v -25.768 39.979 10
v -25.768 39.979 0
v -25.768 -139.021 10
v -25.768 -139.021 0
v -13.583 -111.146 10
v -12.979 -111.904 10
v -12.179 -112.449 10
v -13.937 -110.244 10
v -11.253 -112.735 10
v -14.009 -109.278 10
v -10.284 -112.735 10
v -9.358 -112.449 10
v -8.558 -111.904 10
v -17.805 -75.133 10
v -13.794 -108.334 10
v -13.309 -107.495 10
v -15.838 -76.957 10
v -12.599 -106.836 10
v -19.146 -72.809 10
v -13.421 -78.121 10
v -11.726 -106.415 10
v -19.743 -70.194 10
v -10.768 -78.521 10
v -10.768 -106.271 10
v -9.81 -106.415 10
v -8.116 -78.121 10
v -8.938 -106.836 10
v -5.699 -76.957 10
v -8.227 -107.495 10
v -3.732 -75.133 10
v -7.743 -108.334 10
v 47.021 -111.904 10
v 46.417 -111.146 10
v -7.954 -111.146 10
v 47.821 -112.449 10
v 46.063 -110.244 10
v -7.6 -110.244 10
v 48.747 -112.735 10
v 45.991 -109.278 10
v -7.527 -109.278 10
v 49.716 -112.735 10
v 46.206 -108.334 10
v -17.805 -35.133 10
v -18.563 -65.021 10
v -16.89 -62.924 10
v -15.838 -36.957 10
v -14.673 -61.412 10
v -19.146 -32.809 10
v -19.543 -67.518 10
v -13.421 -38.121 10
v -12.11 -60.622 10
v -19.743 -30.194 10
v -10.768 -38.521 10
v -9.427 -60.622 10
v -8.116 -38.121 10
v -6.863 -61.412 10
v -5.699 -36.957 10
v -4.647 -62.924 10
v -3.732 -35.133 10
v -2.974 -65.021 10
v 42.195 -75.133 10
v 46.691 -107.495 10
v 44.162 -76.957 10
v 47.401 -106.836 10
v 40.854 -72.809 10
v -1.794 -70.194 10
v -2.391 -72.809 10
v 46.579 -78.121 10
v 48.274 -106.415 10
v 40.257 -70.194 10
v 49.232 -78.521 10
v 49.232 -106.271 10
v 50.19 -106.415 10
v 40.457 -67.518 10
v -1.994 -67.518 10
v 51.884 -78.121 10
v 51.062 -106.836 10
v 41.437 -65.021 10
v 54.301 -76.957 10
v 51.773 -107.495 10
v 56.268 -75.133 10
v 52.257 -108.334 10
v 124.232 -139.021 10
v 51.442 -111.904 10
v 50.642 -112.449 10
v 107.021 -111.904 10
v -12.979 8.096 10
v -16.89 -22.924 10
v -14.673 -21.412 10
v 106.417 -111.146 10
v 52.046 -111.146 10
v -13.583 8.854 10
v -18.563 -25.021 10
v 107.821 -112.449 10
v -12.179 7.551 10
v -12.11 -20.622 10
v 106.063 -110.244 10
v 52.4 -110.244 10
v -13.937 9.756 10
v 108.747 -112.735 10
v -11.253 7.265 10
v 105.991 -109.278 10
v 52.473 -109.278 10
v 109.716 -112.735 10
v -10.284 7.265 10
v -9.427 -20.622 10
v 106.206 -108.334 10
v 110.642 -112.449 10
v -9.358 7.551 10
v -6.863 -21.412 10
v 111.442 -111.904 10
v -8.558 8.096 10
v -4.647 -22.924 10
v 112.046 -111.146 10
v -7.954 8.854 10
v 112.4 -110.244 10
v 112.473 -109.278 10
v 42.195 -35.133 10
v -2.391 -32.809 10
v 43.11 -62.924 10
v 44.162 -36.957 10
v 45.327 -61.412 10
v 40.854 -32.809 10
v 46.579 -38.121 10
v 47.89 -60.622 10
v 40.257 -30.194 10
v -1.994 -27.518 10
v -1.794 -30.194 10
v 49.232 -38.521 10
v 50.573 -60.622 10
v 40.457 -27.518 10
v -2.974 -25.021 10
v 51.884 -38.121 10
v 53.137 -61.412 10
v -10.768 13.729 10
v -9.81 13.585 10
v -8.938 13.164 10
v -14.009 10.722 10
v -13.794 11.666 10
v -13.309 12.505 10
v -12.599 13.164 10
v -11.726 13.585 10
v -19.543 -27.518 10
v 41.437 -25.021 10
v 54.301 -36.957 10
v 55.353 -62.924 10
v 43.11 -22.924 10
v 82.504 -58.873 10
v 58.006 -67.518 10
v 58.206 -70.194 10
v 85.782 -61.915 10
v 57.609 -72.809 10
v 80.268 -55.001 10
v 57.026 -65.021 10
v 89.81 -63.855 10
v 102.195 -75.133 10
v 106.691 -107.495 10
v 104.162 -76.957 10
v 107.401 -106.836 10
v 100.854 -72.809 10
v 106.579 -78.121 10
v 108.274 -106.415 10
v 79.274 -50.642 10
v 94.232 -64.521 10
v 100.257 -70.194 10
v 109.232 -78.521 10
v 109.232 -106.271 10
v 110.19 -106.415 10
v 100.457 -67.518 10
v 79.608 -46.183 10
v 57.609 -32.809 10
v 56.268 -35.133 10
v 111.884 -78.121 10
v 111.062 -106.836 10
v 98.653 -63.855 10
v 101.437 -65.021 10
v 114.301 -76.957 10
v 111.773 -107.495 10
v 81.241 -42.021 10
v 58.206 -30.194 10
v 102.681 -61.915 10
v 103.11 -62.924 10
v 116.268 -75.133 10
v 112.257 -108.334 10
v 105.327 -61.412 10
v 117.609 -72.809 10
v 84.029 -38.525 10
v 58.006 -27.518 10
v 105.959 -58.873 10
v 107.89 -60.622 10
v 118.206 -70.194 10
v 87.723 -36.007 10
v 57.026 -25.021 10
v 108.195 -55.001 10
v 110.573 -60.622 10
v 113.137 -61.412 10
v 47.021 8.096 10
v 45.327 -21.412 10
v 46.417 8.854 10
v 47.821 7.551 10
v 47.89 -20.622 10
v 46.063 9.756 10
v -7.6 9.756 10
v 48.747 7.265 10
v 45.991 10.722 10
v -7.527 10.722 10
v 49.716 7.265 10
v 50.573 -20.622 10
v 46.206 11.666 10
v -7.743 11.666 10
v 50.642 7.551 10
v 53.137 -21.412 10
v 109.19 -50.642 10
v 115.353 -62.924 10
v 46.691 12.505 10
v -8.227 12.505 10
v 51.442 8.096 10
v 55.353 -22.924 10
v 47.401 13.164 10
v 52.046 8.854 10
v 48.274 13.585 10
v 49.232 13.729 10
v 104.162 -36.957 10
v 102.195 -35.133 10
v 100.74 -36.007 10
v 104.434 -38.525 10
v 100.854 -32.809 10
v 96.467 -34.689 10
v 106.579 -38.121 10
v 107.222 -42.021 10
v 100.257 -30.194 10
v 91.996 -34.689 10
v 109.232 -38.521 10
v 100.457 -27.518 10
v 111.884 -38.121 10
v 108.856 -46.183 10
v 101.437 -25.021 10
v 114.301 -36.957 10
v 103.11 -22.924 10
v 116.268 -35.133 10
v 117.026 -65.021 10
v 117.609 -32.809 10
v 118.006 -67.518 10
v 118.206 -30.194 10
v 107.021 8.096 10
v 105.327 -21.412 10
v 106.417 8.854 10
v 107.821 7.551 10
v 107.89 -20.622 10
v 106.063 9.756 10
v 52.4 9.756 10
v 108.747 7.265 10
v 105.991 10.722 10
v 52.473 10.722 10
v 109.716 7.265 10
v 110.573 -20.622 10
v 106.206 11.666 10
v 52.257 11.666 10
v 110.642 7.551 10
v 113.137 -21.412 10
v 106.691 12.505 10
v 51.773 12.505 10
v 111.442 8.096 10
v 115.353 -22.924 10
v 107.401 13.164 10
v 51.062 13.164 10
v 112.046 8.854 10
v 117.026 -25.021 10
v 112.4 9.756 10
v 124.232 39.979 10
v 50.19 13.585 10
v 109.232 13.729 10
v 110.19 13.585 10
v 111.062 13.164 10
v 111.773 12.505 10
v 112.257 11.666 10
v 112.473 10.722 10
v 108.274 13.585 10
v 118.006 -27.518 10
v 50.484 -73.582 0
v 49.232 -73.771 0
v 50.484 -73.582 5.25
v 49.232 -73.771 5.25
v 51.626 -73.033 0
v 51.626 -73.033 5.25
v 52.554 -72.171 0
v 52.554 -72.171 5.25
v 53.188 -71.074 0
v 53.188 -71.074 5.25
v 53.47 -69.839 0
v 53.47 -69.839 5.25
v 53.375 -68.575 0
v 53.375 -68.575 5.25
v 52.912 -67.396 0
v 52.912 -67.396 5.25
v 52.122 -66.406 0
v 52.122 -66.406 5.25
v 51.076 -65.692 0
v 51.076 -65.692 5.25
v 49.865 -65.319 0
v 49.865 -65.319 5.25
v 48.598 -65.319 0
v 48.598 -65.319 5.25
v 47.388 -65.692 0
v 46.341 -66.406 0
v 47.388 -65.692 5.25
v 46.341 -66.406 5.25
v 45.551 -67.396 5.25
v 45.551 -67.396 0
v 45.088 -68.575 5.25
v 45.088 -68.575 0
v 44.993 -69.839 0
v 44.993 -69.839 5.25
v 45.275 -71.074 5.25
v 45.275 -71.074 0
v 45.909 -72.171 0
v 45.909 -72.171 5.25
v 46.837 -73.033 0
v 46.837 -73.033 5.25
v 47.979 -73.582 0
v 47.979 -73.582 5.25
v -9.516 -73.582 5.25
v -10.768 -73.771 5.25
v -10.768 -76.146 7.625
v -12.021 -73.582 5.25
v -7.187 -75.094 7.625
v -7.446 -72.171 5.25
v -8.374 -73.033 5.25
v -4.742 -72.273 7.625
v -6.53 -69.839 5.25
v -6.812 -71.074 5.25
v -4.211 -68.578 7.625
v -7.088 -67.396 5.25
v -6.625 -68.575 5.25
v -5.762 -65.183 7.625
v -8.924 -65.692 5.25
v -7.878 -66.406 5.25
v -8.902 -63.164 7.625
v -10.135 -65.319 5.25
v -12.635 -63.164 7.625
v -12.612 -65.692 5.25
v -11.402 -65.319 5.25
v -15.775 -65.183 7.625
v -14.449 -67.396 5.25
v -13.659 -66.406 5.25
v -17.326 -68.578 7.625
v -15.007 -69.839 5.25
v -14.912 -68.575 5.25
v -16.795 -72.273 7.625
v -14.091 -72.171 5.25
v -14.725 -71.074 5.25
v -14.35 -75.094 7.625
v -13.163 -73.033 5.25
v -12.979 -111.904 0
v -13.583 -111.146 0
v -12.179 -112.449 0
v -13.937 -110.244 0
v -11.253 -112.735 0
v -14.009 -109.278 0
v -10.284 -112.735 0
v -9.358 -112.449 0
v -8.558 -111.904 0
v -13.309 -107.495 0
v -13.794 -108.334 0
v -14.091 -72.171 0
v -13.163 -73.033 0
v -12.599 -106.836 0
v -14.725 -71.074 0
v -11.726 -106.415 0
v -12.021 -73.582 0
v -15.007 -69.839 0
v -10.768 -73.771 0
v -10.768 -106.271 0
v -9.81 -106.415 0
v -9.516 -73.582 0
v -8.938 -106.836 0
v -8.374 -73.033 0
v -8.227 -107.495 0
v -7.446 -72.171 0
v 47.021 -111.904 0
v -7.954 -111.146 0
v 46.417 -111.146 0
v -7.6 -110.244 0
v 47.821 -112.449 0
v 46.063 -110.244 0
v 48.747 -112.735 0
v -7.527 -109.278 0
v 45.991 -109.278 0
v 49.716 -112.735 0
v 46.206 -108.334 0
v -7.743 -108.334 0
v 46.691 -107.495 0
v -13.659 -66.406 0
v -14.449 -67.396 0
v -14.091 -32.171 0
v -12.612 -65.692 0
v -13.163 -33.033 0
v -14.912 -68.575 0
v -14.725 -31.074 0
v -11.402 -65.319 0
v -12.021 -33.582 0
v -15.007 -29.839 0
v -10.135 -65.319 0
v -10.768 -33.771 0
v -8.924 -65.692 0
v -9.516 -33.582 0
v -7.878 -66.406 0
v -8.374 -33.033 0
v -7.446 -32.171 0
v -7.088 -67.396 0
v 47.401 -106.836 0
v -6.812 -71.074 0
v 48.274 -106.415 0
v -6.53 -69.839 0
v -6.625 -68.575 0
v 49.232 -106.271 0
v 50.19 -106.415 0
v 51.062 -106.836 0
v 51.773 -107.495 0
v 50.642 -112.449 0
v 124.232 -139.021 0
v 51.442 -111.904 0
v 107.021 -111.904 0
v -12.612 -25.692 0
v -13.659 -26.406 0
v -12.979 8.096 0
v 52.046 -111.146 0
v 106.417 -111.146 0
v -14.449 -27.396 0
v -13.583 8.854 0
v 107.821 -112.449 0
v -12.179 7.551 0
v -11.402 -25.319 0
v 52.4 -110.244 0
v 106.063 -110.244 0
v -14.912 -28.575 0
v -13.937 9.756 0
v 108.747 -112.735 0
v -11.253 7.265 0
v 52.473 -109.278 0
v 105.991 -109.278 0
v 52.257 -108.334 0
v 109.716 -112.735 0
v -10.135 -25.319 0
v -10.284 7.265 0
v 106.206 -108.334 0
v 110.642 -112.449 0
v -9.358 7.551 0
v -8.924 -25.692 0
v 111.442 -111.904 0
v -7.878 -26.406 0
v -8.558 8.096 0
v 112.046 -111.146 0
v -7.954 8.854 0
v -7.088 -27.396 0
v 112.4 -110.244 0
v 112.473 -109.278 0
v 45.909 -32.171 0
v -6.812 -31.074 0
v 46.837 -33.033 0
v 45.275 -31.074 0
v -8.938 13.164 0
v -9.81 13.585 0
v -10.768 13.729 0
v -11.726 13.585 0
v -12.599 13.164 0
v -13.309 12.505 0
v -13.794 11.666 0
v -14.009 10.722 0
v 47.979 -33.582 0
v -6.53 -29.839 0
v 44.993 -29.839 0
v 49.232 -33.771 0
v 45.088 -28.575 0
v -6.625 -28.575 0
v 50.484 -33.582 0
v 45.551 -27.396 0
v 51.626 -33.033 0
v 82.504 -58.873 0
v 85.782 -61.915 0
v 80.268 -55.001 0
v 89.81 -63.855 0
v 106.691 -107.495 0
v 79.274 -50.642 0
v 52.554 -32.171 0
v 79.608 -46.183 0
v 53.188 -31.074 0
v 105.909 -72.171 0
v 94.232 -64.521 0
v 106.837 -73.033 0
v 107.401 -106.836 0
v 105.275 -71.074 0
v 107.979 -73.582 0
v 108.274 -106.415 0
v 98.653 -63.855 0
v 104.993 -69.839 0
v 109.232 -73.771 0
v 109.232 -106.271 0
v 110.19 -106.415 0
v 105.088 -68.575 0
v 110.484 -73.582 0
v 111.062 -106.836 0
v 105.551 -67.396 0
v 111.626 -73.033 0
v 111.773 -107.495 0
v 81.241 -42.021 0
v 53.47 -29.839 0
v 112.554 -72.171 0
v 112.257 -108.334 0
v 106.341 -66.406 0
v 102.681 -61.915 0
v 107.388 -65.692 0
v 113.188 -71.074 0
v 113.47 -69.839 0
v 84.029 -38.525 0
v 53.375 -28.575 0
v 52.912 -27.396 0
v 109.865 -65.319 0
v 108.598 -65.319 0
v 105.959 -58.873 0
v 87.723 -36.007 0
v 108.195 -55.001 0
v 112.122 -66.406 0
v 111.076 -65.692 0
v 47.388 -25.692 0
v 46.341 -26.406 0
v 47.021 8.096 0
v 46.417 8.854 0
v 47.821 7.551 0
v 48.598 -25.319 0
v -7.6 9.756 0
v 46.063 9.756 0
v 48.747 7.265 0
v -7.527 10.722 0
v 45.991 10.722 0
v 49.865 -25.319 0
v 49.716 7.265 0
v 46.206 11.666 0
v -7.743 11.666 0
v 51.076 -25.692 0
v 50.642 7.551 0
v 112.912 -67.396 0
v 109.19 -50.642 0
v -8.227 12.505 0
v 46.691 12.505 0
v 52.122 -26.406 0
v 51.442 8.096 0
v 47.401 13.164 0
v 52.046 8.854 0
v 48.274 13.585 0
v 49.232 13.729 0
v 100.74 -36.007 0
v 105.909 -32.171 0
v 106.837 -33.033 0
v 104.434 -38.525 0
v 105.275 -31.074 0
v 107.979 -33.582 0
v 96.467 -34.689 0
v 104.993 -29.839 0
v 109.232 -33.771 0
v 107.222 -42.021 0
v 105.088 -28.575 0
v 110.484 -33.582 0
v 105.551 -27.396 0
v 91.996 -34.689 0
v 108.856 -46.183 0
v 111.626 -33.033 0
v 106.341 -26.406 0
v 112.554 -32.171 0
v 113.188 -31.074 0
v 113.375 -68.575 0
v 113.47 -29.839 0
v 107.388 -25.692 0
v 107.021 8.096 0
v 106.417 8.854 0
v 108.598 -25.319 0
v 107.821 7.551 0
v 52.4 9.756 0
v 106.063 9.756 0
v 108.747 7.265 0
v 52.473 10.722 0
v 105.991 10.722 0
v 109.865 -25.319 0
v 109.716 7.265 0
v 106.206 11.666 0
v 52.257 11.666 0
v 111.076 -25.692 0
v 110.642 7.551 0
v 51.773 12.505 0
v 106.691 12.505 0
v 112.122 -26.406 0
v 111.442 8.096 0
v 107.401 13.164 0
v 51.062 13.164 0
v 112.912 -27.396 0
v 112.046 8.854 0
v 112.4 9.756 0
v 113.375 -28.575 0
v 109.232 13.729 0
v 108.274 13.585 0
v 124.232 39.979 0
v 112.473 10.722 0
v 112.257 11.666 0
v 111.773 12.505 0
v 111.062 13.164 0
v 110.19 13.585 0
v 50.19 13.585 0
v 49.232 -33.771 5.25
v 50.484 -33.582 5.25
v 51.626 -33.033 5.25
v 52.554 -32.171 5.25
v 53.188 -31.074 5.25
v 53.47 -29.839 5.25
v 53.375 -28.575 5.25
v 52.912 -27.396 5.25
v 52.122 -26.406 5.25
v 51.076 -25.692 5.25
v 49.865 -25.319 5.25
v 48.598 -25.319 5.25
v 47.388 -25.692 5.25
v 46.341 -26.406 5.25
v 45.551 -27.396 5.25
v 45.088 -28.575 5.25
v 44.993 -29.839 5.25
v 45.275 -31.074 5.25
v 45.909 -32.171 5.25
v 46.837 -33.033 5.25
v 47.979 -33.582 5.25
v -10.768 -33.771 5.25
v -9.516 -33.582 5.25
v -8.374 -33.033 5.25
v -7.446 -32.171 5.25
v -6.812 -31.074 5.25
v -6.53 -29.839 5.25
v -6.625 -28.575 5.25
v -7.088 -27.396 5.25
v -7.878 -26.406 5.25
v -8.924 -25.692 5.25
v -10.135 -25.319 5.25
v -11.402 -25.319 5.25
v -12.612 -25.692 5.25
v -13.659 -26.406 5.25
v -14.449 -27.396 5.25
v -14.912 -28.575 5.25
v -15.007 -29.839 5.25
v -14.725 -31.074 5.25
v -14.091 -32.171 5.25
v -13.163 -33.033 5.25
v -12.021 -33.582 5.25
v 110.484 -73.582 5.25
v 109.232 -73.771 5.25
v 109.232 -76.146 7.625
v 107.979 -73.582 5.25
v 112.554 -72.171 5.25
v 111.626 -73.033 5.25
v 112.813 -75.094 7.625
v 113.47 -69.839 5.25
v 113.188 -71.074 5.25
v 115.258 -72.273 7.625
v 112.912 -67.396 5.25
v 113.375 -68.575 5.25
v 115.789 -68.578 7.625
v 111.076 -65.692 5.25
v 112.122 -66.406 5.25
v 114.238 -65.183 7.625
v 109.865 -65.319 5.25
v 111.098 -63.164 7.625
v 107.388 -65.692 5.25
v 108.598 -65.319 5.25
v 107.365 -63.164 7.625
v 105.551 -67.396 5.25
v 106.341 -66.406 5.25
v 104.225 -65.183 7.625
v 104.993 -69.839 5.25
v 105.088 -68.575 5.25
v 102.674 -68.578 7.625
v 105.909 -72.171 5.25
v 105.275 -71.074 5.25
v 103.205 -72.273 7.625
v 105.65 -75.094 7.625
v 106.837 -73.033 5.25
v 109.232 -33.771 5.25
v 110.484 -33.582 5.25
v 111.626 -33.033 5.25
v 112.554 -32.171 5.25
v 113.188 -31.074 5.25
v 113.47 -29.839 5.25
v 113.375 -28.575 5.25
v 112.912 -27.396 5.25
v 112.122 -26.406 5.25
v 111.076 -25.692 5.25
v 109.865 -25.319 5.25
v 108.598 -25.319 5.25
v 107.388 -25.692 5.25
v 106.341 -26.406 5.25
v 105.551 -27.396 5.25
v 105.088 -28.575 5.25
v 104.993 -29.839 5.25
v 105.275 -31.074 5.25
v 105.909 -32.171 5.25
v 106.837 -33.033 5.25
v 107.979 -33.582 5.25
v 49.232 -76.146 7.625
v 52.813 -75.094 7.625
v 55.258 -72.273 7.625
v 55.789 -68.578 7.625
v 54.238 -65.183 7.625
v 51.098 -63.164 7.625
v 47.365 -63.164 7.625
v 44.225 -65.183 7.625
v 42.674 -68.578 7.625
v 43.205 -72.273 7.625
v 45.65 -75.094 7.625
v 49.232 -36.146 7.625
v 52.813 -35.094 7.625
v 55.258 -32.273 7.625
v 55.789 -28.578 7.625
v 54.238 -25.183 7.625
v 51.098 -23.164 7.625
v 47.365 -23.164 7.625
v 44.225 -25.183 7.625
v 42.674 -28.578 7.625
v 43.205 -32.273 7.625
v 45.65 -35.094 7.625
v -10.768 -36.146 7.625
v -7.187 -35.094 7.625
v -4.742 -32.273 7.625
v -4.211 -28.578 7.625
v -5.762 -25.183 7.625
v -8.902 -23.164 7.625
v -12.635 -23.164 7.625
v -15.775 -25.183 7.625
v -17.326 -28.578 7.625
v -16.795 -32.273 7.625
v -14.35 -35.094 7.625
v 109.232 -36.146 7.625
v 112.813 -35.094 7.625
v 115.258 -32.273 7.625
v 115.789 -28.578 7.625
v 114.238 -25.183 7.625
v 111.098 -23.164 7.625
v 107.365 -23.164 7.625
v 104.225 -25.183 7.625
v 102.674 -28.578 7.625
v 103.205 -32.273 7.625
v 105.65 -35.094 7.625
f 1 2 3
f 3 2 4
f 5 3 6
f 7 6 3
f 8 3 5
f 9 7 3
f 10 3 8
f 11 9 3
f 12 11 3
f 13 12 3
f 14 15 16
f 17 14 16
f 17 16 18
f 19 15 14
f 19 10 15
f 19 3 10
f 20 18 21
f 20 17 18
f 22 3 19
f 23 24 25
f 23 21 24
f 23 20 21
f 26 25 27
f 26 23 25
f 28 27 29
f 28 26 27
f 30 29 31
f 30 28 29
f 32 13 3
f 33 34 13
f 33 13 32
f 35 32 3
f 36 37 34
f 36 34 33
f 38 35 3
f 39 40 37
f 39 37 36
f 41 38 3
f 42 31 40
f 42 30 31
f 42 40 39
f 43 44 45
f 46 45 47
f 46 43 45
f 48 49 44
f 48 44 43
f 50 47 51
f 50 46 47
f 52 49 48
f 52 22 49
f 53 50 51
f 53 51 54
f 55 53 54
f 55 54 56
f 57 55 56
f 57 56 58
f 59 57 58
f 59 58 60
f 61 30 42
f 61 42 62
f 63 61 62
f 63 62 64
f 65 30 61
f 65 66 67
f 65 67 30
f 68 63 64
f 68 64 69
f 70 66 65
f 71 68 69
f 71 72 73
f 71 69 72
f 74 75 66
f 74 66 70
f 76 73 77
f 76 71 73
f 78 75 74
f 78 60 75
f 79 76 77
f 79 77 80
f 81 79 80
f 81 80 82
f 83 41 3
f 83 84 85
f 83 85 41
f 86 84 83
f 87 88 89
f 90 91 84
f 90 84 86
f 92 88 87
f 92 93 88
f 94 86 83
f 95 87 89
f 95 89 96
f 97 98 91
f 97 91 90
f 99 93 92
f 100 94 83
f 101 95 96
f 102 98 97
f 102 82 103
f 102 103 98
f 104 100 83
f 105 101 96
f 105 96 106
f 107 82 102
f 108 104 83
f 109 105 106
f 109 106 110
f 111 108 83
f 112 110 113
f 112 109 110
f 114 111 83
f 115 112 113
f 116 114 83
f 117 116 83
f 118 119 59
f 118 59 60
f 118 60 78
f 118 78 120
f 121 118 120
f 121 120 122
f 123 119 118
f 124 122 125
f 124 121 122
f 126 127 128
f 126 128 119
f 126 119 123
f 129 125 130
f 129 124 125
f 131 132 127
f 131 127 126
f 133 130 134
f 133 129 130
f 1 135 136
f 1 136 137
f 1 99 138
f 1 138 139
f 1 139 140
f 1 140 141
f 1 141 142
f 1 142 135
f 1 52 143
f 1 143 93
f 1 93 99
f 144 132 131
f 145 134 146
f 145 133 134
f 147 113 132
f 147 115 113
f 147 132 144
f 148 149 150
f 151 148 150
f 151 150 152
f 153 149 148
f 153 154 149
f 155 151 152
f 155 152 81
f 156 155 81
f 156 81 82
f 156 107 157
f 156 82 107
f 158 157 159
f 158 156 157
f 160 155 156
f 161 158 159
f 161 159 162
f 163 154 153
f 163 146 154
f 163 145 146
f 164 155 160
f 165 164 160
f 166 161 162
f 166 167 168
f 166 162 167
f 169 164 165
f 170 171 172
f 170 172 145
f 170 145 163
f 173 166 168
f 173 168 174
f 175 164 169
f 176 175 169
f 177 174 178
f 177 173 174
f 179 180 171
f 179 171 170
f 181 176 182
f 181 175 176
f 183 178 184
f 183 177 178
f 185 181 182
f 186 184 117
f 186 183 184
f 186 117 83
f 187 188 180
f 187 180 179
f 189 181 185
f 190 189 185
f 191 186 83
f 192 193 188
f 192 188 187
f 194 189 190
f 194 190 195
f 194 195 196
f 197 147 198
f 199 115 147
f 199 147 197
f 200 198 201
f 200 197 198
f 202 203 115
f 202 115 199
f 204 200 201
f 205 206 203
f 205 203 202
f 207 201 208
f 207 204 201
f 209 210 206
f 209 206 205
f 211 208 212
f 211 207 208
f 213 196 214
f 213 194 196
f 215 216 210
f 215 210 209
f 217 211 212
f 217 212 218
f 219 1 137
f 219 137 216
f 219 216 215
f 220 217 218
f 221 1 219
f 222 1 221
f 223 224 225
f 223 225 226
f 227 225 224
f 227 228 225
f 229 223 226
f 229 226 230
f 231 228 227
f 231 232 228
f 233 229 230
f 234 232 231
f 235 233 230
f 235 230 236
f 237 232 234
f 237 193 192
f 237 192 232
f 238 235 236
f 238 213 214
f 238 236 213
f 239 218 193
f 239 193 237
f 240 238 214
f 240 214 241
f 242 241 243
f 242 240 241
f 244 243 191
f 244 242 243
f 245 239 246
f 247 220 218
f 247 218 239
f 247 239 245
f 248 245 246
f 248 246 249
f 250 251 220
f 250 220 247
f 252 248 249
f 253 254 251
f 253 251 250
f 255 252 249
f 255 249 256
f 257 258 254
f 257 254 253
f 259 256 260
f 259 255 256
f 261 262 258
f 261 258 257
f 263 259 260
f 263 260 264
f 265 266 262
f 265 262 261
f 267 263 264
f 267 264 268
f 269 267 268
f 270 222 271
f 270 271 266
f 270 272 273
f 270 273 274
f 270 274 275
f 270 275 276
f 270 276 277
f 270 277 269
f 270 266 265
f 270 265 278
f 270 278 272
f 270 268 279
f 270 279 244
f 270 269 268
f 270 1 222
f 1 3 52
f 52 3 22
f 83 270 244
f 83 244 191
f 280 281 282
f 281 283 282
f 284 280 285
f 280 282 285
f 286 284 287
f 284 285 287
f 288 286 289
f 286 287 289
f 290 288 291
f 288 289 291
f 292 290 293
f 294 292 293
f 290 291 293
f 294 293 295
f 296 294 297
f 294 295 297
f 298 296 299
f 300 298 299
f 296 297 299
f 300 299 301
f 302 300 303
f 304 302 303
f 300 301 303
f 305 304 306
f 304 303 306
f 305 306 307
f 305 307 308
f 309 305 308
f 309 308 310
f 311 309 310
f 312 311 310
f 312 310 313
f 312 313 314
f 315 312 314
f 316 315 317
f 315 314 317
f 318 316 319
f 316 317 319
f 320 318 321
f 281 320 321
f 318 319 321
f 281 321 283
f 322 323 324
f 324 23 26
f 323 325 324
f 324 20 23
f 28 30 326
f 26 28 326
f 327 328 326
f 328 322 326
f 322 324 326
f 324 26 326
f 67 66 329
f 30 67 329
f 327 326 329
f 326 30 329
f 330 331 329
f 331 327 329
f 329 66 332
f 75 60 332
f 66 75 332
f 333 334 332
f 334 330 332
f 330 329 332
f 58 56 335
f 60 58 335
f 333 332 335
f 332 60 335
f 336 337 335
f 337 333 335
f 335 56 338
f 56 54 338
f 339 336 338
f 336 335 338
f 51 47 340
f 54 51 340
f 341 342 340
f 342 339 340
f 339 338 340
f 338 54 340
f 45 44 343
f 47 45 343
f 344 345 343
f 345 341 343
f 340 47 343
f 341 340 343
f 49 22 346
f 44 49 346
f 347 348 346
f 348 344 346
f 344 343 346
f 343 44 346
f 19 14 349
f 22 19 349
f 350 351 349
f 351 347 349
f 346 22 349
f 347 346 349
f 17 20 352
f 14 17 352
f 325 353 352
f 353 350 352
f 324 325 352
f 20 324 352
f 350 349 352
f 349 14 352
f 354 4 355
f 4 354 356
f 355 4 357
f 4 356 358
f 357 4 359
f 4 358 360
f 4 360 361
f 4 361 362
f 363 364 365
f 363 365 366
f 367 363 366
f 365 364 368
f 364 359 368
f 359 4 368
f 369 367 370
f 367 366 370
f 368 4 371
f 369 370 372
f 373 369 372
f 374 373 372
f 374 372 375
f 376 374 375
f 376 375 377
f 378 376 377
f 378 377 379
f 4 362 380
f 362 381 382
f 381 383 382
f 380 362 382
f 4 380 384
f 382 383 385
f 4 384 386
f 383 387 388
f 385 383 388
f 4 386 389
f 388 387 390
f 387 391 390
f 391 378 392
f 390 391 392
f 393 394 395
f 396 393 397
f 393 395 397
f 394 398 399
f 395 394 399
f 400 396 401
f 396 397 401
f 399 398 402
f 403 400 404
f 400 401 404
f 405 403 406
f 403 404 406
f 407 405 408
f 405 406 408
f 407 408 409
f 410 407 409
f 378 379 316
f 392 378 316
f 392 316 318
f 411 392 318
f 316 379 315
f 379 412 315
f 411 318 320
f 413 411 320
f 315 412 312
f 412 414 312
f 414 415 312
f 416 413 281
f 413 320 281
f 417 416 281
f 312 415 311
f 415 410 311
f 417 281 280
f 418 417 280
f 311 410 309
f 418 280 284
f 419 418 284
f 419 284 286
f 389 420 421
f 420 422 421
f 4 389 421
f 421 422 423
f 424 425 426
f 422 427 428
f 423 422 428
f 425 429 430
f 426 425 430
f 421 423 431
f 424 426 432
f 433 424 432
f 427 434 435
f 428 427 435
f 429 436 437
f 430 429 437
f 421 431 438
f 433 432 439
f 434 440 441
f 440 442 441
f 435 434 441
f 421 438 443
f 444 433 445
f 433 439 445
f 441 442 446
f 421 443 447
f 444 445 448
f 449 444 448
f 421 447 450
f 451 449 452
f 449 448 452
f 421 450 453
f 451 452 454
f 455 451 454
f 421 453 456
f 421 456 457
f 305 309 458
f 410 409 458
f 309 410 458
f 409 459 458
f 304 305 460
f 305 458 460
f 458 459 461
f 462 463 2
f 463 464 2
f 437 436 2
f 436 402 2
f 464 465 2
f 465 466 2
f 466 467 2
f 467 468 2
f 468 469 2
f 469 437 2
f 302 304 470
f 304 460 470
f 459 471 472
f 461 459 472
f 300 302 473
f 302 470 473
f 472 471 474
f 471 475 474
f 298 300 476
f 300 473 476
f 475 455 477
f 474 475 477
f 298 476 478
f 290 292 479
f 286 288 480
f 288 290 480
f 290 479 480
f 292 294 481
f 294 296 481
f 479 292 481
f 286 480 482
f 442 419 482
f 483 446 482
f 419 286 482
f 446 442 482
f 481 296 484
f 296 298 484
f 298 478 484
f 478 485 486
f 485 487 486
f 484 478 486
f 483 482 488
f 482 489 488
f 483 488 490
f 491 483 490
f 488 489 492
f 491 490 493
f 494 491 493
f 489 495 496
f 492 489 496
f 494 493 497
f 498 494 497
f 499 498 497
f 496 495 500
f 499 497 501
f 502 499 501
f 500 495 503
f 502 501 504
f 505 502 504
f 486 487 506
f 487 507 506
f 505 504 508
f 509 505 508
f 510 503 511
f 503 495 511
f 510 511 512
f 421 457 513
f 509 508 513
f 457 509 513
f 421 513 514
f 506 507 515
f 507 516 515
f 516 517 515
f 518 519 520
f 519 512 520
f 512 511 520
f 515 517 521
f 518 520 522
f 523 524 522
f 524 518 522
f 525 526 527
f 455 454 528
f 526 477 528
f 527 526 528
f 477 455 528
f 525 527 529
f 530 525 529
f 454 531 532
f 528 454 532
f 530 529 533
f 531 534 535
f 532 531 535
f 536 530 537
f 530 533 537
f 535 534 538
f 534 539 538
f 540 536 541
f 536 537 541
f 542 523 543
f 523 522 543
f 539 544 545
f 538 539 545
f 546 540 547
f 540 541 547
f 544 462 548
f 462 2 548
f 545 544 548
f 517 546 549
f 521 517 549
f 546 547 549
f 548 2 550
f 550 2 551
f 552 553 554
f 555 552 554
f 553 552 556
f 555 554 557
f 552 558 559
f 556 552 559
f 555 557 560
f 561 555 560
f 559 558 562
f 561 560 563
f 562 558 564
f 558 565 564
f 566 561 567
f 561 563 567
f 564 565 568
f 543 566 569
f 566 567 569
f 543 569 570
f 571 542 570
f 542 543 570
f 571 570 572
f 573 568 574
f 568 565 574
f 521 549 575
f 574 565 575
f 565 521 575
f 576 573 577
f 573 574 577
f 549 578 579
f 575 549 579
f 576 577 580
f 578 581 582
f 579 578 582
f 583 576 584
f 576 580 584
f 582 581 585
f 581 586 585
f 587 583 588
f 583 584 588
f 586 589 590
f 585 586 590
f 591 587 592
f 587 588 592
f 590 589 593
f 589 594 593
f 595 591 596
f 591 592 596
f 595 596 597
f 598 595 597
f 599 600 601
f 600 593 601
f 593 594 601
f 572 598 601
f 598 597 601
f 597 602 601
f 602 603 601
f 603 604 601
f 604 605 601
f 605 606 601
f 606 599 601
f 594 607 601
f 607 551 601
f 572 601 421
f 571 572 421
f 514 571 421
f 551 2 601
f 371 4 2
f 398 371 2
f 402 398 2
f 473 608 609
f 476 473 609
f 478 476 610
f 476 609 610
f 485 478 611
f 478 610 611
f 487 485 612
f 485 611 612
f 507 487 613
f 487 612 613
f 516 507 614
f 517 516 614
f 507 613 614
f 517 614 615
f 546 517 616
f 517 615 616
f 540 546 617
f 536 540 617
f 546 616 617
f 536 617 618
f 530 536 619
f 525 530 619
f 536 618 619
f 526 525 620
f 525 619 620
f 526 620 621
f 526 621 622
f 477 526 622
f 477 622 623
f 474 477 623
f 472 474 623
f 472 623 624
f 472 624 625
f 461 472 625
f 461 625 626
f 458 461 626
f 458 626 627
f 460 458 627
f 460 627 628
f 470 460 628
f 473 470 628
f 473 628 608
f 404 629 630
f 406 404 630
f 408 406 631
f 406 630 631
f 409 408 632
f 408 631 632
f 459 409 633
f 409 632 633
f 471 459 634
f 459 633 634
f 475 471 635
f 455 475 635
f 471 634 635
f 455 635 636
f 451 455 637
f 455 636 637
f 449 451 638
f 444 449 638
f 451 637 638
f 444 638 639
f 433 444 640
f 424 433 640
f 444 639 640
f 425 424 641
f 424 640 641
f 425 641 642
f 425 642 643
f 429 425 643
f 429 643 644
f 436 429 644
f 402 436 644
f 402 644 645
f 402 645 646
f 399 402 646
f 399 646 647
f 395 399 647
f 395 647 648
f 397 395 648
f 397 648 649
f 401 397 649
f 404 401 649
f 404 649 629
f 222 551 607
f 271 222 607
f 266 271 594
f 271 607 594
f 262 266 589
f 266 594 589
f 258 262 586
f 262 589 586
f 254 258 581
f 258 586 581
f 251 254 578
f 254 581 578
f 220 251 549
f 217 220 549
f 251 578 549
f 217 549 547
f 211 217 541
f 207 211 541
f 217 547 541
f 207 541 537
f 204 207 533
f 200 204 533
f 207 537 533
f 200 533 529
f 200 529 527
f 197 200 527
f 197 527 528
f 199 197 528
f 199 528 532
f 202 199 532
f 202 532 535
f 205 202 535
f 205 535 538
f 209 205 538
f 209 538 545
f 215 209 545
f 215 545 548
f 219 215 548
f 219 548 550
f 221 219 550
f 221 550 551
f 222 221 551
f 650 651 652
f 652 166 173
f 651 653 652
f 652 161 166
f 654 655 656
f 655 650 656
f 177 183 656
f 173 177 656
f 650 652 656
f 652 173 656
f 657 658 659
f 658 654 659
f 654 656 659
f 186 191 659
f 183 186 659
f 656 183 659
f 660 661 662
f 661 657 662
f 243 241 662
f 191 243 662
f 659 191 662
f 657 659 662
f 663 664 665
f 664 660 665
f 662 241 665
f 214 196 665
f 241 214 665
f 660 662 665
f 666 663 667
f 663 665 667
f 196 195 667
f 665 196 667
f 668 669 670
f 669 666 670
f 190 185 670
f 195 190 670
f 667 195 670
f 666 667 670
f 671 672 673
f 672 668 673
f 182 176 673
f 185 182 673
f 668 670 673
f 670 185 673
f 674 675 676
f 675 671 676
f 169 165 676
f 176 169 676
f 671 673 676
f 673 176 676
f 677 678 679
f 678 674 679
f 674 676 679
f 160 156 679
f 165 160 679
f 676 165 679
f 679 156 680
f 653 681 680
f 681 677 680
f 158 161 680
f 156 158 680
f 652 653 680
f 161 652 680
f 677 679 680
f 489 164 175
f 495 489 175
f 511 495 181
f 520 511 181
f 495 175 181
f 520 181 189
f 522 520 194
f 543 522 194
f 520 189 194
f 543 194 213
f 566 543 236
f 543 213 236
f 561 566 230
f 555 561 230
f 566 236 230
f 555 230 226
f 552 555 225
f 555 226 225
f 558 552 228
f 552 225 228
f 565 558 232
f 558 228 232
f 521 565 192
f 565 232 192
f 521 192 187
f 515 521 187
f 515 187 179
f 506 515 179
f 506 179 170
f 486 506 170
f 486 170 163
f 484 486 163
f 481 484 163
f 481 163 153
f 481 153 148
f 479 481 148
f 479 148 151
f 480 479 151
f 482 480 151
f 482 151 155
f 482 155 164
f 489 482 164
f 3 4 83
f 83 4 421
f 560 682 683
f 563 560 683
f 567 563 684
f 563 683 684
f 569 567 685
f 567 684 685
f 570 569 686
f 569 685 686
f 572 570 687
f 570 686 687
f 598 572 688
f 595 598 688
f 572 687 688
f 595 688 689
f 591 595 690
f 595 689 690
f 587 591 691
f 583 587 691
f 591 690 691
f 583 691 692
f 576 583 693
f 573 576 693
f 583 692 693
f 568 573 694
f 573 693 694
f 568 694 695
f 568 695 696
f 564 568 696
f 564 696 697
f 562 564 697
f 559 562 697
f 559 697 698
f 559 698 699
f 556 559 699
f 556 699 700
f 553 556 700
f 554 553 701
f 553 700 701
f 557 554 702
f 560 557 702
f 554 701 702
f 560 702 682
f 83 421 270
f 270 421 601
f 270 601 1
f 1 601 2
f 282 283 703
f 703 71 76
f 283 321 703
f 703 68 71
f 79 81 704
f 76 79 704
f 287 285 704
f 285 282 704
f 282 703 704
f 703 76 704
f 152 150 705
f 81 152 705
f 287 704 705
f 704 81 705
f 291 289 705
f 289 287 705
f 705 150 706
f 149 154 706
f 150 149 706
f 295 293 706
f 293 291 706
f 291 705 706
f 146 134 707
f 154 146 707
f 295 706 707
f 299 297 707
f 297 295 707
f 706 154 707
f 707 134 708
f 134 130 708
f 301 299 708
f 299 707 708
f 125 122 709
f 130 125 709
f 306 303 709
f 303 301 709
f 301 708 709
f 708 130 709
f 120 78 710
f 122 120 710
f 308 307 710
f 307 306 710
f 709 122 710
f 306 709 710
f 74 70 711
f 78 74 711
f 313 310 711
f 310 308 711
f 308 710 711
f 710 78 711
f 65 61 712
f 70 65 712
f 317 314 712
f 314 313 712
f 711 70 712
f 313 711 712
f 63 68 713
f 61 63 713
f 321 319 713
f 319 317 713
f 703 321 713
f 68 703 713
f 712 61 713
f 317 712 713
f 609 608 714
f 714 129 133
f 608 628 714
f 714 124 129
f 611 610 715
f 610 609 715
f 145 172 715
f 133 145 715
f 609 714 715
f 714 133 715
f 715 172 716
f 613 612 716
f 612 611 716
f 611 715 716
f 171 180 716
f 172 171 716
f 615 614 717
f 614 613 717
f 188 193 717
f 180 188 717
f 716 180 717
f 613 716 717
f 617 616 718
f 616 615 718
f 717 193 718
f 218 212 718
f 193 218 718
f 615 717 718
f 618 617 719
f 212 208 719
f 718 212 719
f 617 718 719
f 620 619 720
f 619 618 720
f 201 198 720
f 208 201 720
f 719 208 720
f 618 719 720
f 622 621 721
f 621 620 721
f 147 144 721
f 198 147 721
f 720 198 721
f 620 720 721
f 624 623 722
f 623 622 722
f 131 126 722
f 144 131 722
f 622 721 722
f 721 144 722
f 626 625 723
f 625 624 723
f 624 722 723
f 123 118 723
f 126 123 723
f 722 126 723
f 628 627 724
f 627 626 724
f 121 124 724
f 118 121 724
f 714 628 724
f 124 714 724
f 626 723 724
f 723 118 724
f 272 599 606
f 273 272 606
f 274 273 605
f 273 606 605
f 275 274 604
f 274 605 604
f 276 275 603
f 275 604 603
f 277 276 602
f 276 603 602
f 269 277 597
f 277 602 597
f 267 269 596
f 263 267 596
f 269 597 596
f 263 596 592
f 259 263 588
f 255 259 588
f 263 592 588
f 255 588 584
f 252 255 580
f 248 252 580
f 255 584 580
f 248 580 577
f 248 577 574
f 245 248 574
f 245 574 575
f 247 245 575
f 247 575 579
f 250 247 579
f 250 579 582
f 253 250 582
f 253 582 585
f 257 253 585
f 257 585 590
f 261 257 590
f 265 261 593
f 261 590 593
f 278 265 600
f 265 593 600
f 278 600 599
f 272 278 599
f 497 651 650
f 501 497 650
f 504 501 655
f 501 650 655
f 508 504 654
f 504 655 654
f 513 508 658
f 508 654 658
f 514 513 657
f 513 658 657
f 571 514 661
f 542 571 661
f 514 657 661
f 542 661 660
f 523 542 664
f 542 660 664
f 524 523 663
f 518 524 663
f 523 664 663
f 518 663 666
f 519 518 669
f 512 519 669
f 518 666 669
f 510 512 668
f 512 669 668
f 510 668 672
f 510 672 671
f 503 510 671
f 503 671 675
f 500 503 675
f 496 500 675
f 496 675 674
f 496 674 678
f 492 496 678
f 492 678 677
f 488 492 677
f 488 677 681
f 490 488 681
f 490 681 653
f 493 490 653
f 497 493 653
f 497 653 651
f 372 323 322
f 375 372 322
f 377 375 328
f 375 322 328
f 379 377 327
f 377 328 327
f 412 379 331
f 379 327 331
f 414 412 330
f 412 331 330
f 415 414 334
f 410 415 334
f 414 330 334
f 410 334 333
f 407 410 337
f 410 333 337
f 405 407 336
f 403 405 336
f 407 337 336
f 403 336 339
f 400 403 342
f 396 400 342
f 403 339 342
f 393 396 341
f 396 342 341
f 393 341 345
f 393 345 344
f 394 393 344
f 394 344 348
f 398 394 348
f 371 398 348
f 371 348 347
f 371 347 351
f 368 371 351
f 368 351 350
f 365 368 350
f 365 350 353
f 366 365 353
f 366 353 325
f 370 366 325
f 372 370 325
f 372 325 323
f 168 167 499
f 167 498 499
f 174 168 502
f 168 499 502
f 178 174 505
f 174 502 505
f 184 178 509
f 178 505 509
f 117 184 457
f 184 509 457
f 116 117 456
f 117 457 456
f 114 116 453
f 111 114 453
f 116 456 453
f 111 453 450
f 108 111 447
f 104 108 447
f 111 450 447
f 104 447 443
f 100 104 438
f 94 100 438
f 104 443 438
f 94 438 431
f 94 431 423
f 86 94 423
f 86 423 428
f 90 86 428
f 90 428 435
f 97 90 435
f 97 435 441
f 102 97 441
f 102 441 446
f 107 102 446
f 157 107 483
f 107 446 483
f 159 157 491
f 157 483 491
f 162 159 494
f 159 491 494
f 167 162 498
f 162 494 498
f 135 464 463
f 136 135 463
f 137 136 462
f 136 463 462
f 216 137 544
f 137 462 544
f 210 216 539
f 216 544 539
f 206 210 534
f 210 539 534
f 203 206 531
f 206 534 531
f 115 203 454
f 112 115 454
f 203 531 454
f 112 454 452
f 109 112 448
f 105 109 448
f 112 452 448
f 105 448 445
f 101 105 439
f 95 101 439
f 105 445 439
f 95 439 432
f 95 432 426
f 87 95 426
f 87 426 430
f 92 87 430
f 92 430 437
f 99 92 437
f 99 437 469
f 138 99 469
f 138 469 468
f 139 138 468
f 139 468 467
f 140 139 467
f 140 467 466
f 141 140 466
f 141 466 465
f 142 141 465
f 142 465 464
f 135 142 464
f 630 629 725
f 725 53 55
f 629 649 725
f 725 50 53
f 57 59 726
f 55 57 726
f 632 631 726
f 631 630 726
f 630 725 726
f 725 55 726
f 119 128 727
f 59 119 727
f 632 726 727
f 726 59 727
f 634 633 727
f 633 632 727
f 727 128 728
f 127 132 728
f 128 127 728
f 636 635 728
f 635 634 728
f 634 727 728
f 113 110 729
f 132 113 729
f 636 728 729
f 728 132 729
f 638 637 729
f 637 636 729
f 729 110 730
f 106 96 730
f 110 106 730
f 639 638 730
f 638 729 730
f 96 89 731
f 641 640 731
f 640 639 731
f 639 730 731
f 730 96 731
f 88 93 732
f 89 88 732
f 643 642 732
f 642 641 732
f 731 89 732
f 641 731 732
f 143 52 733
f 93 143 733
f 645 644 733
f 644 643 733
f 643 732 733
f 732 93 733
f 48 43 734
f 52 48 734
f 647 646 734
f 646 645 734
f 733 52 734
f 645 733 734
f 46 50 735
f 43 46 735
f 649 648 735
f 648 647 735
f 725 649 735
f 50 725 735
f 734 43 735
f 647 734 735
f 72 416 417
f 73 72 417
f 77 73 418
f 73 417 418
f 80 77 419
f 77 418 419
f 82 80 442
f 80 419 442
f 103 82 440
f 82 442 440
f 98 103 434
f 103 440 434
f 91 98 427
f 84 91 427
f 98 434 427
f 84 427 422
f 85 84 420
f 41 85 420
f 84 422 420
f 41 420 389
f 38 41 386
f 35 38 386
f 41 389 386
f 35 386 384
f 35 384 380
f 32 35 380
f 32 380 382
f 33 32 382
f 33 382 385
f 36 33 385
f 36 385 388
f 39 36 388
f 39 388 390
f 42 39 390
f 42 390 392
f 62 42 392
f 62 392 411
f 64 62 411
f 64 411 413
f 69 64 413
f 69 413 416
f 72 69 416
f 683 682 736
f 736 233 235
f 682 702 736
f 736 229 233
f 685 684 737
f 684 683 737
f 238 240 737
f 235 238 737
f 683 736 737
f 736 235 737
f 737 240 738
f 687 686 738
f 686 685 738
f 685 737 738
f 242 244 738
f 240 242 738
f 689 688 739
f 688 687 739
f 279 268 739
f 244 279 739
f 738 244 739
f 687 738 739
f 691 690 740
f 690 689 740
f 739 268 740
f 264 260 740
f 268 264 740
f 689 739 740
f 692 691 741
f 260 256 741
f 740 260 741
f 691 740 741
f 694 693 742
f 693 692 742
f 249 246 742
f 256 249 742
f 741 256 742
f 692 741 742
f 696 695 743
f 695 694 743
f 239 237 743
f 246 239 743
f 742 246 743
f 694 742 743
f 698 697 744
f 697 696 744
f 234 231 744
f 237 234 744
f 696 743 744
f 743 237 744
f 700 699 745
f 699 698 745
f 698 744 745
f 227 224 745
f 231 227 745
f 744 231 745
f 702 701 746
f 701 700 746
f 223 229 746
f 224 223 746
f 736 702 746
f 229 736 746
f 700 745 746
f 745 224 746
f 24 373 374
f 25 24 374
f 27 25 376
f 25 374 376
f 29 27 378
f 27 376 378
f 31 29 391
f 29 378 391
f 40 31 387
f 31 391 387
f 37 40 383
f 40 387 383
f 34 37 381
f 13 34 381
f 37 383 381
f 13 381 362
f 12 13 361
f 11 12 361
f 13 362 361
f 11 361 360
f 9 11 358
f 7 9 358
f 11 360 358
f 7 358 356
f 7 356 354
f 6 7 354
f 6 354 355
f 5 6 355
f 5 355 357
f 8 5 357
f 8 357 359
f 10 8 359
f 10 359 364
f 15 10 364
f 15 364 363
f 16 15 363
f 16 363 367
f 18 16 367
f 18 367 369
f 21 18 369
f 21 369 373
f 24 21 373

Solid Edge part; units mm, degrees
sketch "Sketch1" plane through (0, 0, 0) normal (0, 0, 1) x (1, 0, 0)
  line L0 (-25.7684, -139.0211) -> (124.2316, -139.0211)
  line L1 (124.2316, -139.0211) -> (124.2316, 39.9789)
  line L2 (124.2316, 39.9789) -> (-25.7684, 39.9789)
  line L3 (-25.7684, 39.9789) -> (-25.7684, -139.0211)
  dimension "D1" = 150
  dimension "D2" = 179
extrude "Protrusion1" add sketch "Sketch1" along normal blind 10
sketch "Sketch2" plane through (49.2316, -49.5211, 10) normal (0, 0, 1) x (0, -1, 0)
  circle A0 centre (0, 45) radius 15
  dimension "D1" = 30
  dimension "D2" = 45
extrude "Cutout1" cut sketch "Sketch2" against normal through all
hole "Hole_1" at (49.2316, -29.5211, 10) direction (0, 0, -1) diameter 8.5 end up to next countersink diameter 18 countersink angle 90
hole "Hole1" at (109.2316, -29.5211, 10) direction (0, 0, -1) diameter 8.5 end up to next countersink diameter 18 countersink angle 90
hole "Hole2" at (109.2316, -69.5211, 10) direction (0, 0, -1) diameter 8.5 end up to next countersink diameter 18 countersink angle 90
hole "Hole3" at (49.2316, -69.5211, 10) direction (0, 0, -1) diameter 8.5 end up to next countersink diameter 18 countersink angle 90
hole "Hole4" at (-10.7684, -69.5211, 10) direction (0, 0, -1) diameter 8.5 end up to next countersink diameter 18 countersink angle 90
hole "Hole5" at (-10.7684, -29.5211, 10) direction (0, 0, -1) diameter 8.5 end up to next countersink diameter 18 countersink angle 90
hole "Hole_7" at (49.2316, -109.5211, 0) direction (0, 0, 1) diameter 6.5 end up to next
hole "Hole6" at (-10.7684, -109.5211, 0) direction (0, 0, 1) diameter 6.5 end up to next
hole "Hole7" at (-10.7684, 10.4789, 0) direction (0, 0, 1) diameter 6.5 end up to next
hole "Hole8" at (49.2316, 10.4789, 0) direction (0, 0, 1) diameter 6.5 end up to next
hole "Hole9" at (109.2316, 10.4789, 0) direction (0, 0, 1) diameter 6.5 end up to next
hole "Hole10" at (109.2316, -109.5211, 0) direction (0, 0, 1) diameter 6.5 end up to next
properties material "Aluminum, 6061-T6"
